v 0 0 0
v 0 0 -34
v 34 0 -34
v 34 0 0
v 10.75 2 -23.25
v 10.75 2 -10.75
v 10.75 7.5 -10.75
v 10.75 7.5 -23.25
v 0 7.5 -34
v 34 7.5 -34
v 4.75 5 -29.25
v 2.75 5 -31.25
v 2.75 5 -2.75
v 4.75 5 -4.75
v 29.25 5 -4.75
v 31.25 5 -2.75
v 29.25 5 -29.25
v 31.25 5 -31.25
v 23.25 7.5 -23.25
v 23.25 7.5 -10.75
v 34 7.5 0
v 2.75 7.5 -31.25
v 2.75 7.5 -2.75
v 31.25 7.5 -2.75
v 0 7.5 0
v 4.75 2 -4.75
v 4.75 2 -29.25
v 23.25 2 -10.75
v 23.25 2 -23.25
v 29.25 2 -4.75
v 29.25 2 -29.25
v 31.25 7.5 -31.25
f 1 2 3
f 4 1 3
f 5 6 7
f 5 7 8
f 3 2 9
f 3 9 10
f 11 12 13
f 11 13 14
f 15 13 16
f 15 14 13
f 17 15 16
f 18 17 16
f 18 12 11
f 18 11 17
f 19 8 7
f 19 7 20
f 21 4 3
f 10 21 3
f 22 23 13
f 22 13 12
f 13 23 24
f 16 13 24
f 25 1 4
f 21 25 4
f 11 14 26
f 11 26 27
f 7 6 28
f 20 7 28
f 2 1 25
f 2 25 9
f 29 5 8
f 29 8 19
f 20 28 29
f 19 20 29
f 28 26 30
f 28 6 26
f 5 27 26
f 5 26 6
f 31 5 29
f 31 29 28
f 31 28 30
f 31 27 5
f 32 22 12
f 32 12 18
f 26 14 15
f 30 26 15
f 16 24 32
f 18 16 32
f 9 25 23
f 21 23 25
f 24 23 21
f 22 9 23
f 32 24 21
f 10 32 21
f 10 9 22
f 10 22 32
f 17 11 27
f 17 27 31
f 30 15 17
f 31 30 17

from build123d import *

# Parameters (mm, degrees)
SKETCH_1_W          = 34
SKETCH_1_H          = 34
EXTRUDE_1_DEPTH     = 8
SKETCH_2_W          = 24.5
SKETCH_2_H          = 24.5
CUT_EXTRUDE_1_DEPTH = 6
SKETCH_3_W          = 28.5
SKETCH_3_H          = 28.5
CUT_EXTRUDE_2_DEPTH = 3
SKETCH_4_W          = 12.5
SKETCH_4_H          = 12.5
EXTRUDE_2_DEPTH     = 6
SKETCH_5_W          = 34
SKETCH_5_H          = 34
SKETCH_5_W_2        = 28.5
SKETCH_5_H_2        = 28.5
SKETCH_5_W_3        = 12.5
SKETCH_5_H_3        = 12.5
CUT_EXTRUDE_4_DEPTH = 0.5


with BuildPart() as part:
    # Эскиз1 → Бобышка-Вытянуть1 (new body)
    with BuildSketch(Plane(origin=(0, 0, 0), x_dir=(1, 0, 0), z_dir=(0, 1, 0))):
        with Locations((17, 17)):
            Rectangle(SKETCH_1_W, SKETCH_1_H)
    extrude(amount=EXTRUDE_1_DEPTH)

    # Эскиз2 → Вырез-Вытянуть1 (cut)
    with BuildSketch(Plane(origin=(0, 8, 0), x_dir=(1, 0, 0), z_dir=(0, 1, 0))):
        with Locations((17, 17)):
            Rectangle(SKETCH_2_W, SKETCH_2_H)
    extrude(amount=-CUT_EXTRUDE_1_DEPTH, mode=Mode.SUBTRACT)

    # Эскиз3 → Вырез-Вытянуть2 (cut)
    with BuildSketch(Plane(origin=(0, 8, 0), x_dir=(1, 0, 0), z_dir=(0, 1, 0))):
        with Locations((17, 17)):
            Rectangle(SKETCH_3_W, SKETCH_3_H)
    extrude(amount=-CUT_EXTRUDE_2_DEPTH, mode=Mode.SUBTRACT)

    # Эскиз4 → Бобышка-Вытянуть2 (add)
    with BuildSketch(Plane(origin=(0, 2, 0), x_dir=(1, 0, 0), z_dir=(0, 1, 0))):
        with Locations((17, 17)):
            Rectangle(SKETCH_4_W, SKETCH_4_H)
    extrude(amount=EXTRUDE_2_DEPTH)

    # Эскиз5 → Вырез-Вытянуть4 (cut)
    # profile 1 of 2: a face of its own
    with BuildSketch(Plane(origin=(0, 8, 0), x_dir=(1, 0, 0), z_dir=(0, 1, 0))):
        with Locations((17, 17)):
            Rectangle(SKETCH_5_W, SKETCH_5_H)
        with Locations((17, 17)):
            Rectangle(SKETCH_5_W_2, SKETCH_5_H_2, mode=Mode.SUBTRACT)
    # profile 2 of 2: a face of its own
    with BuildSketch(Plane(origin=(0, 8, 0), x_dir=(1, 0, 0), z_dir=(0, 1, 0))):
        with Locations((17, 17)):
            Rectangle(SKETCH_5_W_3, SKETCH_5_H_3)
    extrude(amount=-CUT_EXTRUDE_4_DEPTH, mode=Mode.SUBTRACT)


solid = part.part
